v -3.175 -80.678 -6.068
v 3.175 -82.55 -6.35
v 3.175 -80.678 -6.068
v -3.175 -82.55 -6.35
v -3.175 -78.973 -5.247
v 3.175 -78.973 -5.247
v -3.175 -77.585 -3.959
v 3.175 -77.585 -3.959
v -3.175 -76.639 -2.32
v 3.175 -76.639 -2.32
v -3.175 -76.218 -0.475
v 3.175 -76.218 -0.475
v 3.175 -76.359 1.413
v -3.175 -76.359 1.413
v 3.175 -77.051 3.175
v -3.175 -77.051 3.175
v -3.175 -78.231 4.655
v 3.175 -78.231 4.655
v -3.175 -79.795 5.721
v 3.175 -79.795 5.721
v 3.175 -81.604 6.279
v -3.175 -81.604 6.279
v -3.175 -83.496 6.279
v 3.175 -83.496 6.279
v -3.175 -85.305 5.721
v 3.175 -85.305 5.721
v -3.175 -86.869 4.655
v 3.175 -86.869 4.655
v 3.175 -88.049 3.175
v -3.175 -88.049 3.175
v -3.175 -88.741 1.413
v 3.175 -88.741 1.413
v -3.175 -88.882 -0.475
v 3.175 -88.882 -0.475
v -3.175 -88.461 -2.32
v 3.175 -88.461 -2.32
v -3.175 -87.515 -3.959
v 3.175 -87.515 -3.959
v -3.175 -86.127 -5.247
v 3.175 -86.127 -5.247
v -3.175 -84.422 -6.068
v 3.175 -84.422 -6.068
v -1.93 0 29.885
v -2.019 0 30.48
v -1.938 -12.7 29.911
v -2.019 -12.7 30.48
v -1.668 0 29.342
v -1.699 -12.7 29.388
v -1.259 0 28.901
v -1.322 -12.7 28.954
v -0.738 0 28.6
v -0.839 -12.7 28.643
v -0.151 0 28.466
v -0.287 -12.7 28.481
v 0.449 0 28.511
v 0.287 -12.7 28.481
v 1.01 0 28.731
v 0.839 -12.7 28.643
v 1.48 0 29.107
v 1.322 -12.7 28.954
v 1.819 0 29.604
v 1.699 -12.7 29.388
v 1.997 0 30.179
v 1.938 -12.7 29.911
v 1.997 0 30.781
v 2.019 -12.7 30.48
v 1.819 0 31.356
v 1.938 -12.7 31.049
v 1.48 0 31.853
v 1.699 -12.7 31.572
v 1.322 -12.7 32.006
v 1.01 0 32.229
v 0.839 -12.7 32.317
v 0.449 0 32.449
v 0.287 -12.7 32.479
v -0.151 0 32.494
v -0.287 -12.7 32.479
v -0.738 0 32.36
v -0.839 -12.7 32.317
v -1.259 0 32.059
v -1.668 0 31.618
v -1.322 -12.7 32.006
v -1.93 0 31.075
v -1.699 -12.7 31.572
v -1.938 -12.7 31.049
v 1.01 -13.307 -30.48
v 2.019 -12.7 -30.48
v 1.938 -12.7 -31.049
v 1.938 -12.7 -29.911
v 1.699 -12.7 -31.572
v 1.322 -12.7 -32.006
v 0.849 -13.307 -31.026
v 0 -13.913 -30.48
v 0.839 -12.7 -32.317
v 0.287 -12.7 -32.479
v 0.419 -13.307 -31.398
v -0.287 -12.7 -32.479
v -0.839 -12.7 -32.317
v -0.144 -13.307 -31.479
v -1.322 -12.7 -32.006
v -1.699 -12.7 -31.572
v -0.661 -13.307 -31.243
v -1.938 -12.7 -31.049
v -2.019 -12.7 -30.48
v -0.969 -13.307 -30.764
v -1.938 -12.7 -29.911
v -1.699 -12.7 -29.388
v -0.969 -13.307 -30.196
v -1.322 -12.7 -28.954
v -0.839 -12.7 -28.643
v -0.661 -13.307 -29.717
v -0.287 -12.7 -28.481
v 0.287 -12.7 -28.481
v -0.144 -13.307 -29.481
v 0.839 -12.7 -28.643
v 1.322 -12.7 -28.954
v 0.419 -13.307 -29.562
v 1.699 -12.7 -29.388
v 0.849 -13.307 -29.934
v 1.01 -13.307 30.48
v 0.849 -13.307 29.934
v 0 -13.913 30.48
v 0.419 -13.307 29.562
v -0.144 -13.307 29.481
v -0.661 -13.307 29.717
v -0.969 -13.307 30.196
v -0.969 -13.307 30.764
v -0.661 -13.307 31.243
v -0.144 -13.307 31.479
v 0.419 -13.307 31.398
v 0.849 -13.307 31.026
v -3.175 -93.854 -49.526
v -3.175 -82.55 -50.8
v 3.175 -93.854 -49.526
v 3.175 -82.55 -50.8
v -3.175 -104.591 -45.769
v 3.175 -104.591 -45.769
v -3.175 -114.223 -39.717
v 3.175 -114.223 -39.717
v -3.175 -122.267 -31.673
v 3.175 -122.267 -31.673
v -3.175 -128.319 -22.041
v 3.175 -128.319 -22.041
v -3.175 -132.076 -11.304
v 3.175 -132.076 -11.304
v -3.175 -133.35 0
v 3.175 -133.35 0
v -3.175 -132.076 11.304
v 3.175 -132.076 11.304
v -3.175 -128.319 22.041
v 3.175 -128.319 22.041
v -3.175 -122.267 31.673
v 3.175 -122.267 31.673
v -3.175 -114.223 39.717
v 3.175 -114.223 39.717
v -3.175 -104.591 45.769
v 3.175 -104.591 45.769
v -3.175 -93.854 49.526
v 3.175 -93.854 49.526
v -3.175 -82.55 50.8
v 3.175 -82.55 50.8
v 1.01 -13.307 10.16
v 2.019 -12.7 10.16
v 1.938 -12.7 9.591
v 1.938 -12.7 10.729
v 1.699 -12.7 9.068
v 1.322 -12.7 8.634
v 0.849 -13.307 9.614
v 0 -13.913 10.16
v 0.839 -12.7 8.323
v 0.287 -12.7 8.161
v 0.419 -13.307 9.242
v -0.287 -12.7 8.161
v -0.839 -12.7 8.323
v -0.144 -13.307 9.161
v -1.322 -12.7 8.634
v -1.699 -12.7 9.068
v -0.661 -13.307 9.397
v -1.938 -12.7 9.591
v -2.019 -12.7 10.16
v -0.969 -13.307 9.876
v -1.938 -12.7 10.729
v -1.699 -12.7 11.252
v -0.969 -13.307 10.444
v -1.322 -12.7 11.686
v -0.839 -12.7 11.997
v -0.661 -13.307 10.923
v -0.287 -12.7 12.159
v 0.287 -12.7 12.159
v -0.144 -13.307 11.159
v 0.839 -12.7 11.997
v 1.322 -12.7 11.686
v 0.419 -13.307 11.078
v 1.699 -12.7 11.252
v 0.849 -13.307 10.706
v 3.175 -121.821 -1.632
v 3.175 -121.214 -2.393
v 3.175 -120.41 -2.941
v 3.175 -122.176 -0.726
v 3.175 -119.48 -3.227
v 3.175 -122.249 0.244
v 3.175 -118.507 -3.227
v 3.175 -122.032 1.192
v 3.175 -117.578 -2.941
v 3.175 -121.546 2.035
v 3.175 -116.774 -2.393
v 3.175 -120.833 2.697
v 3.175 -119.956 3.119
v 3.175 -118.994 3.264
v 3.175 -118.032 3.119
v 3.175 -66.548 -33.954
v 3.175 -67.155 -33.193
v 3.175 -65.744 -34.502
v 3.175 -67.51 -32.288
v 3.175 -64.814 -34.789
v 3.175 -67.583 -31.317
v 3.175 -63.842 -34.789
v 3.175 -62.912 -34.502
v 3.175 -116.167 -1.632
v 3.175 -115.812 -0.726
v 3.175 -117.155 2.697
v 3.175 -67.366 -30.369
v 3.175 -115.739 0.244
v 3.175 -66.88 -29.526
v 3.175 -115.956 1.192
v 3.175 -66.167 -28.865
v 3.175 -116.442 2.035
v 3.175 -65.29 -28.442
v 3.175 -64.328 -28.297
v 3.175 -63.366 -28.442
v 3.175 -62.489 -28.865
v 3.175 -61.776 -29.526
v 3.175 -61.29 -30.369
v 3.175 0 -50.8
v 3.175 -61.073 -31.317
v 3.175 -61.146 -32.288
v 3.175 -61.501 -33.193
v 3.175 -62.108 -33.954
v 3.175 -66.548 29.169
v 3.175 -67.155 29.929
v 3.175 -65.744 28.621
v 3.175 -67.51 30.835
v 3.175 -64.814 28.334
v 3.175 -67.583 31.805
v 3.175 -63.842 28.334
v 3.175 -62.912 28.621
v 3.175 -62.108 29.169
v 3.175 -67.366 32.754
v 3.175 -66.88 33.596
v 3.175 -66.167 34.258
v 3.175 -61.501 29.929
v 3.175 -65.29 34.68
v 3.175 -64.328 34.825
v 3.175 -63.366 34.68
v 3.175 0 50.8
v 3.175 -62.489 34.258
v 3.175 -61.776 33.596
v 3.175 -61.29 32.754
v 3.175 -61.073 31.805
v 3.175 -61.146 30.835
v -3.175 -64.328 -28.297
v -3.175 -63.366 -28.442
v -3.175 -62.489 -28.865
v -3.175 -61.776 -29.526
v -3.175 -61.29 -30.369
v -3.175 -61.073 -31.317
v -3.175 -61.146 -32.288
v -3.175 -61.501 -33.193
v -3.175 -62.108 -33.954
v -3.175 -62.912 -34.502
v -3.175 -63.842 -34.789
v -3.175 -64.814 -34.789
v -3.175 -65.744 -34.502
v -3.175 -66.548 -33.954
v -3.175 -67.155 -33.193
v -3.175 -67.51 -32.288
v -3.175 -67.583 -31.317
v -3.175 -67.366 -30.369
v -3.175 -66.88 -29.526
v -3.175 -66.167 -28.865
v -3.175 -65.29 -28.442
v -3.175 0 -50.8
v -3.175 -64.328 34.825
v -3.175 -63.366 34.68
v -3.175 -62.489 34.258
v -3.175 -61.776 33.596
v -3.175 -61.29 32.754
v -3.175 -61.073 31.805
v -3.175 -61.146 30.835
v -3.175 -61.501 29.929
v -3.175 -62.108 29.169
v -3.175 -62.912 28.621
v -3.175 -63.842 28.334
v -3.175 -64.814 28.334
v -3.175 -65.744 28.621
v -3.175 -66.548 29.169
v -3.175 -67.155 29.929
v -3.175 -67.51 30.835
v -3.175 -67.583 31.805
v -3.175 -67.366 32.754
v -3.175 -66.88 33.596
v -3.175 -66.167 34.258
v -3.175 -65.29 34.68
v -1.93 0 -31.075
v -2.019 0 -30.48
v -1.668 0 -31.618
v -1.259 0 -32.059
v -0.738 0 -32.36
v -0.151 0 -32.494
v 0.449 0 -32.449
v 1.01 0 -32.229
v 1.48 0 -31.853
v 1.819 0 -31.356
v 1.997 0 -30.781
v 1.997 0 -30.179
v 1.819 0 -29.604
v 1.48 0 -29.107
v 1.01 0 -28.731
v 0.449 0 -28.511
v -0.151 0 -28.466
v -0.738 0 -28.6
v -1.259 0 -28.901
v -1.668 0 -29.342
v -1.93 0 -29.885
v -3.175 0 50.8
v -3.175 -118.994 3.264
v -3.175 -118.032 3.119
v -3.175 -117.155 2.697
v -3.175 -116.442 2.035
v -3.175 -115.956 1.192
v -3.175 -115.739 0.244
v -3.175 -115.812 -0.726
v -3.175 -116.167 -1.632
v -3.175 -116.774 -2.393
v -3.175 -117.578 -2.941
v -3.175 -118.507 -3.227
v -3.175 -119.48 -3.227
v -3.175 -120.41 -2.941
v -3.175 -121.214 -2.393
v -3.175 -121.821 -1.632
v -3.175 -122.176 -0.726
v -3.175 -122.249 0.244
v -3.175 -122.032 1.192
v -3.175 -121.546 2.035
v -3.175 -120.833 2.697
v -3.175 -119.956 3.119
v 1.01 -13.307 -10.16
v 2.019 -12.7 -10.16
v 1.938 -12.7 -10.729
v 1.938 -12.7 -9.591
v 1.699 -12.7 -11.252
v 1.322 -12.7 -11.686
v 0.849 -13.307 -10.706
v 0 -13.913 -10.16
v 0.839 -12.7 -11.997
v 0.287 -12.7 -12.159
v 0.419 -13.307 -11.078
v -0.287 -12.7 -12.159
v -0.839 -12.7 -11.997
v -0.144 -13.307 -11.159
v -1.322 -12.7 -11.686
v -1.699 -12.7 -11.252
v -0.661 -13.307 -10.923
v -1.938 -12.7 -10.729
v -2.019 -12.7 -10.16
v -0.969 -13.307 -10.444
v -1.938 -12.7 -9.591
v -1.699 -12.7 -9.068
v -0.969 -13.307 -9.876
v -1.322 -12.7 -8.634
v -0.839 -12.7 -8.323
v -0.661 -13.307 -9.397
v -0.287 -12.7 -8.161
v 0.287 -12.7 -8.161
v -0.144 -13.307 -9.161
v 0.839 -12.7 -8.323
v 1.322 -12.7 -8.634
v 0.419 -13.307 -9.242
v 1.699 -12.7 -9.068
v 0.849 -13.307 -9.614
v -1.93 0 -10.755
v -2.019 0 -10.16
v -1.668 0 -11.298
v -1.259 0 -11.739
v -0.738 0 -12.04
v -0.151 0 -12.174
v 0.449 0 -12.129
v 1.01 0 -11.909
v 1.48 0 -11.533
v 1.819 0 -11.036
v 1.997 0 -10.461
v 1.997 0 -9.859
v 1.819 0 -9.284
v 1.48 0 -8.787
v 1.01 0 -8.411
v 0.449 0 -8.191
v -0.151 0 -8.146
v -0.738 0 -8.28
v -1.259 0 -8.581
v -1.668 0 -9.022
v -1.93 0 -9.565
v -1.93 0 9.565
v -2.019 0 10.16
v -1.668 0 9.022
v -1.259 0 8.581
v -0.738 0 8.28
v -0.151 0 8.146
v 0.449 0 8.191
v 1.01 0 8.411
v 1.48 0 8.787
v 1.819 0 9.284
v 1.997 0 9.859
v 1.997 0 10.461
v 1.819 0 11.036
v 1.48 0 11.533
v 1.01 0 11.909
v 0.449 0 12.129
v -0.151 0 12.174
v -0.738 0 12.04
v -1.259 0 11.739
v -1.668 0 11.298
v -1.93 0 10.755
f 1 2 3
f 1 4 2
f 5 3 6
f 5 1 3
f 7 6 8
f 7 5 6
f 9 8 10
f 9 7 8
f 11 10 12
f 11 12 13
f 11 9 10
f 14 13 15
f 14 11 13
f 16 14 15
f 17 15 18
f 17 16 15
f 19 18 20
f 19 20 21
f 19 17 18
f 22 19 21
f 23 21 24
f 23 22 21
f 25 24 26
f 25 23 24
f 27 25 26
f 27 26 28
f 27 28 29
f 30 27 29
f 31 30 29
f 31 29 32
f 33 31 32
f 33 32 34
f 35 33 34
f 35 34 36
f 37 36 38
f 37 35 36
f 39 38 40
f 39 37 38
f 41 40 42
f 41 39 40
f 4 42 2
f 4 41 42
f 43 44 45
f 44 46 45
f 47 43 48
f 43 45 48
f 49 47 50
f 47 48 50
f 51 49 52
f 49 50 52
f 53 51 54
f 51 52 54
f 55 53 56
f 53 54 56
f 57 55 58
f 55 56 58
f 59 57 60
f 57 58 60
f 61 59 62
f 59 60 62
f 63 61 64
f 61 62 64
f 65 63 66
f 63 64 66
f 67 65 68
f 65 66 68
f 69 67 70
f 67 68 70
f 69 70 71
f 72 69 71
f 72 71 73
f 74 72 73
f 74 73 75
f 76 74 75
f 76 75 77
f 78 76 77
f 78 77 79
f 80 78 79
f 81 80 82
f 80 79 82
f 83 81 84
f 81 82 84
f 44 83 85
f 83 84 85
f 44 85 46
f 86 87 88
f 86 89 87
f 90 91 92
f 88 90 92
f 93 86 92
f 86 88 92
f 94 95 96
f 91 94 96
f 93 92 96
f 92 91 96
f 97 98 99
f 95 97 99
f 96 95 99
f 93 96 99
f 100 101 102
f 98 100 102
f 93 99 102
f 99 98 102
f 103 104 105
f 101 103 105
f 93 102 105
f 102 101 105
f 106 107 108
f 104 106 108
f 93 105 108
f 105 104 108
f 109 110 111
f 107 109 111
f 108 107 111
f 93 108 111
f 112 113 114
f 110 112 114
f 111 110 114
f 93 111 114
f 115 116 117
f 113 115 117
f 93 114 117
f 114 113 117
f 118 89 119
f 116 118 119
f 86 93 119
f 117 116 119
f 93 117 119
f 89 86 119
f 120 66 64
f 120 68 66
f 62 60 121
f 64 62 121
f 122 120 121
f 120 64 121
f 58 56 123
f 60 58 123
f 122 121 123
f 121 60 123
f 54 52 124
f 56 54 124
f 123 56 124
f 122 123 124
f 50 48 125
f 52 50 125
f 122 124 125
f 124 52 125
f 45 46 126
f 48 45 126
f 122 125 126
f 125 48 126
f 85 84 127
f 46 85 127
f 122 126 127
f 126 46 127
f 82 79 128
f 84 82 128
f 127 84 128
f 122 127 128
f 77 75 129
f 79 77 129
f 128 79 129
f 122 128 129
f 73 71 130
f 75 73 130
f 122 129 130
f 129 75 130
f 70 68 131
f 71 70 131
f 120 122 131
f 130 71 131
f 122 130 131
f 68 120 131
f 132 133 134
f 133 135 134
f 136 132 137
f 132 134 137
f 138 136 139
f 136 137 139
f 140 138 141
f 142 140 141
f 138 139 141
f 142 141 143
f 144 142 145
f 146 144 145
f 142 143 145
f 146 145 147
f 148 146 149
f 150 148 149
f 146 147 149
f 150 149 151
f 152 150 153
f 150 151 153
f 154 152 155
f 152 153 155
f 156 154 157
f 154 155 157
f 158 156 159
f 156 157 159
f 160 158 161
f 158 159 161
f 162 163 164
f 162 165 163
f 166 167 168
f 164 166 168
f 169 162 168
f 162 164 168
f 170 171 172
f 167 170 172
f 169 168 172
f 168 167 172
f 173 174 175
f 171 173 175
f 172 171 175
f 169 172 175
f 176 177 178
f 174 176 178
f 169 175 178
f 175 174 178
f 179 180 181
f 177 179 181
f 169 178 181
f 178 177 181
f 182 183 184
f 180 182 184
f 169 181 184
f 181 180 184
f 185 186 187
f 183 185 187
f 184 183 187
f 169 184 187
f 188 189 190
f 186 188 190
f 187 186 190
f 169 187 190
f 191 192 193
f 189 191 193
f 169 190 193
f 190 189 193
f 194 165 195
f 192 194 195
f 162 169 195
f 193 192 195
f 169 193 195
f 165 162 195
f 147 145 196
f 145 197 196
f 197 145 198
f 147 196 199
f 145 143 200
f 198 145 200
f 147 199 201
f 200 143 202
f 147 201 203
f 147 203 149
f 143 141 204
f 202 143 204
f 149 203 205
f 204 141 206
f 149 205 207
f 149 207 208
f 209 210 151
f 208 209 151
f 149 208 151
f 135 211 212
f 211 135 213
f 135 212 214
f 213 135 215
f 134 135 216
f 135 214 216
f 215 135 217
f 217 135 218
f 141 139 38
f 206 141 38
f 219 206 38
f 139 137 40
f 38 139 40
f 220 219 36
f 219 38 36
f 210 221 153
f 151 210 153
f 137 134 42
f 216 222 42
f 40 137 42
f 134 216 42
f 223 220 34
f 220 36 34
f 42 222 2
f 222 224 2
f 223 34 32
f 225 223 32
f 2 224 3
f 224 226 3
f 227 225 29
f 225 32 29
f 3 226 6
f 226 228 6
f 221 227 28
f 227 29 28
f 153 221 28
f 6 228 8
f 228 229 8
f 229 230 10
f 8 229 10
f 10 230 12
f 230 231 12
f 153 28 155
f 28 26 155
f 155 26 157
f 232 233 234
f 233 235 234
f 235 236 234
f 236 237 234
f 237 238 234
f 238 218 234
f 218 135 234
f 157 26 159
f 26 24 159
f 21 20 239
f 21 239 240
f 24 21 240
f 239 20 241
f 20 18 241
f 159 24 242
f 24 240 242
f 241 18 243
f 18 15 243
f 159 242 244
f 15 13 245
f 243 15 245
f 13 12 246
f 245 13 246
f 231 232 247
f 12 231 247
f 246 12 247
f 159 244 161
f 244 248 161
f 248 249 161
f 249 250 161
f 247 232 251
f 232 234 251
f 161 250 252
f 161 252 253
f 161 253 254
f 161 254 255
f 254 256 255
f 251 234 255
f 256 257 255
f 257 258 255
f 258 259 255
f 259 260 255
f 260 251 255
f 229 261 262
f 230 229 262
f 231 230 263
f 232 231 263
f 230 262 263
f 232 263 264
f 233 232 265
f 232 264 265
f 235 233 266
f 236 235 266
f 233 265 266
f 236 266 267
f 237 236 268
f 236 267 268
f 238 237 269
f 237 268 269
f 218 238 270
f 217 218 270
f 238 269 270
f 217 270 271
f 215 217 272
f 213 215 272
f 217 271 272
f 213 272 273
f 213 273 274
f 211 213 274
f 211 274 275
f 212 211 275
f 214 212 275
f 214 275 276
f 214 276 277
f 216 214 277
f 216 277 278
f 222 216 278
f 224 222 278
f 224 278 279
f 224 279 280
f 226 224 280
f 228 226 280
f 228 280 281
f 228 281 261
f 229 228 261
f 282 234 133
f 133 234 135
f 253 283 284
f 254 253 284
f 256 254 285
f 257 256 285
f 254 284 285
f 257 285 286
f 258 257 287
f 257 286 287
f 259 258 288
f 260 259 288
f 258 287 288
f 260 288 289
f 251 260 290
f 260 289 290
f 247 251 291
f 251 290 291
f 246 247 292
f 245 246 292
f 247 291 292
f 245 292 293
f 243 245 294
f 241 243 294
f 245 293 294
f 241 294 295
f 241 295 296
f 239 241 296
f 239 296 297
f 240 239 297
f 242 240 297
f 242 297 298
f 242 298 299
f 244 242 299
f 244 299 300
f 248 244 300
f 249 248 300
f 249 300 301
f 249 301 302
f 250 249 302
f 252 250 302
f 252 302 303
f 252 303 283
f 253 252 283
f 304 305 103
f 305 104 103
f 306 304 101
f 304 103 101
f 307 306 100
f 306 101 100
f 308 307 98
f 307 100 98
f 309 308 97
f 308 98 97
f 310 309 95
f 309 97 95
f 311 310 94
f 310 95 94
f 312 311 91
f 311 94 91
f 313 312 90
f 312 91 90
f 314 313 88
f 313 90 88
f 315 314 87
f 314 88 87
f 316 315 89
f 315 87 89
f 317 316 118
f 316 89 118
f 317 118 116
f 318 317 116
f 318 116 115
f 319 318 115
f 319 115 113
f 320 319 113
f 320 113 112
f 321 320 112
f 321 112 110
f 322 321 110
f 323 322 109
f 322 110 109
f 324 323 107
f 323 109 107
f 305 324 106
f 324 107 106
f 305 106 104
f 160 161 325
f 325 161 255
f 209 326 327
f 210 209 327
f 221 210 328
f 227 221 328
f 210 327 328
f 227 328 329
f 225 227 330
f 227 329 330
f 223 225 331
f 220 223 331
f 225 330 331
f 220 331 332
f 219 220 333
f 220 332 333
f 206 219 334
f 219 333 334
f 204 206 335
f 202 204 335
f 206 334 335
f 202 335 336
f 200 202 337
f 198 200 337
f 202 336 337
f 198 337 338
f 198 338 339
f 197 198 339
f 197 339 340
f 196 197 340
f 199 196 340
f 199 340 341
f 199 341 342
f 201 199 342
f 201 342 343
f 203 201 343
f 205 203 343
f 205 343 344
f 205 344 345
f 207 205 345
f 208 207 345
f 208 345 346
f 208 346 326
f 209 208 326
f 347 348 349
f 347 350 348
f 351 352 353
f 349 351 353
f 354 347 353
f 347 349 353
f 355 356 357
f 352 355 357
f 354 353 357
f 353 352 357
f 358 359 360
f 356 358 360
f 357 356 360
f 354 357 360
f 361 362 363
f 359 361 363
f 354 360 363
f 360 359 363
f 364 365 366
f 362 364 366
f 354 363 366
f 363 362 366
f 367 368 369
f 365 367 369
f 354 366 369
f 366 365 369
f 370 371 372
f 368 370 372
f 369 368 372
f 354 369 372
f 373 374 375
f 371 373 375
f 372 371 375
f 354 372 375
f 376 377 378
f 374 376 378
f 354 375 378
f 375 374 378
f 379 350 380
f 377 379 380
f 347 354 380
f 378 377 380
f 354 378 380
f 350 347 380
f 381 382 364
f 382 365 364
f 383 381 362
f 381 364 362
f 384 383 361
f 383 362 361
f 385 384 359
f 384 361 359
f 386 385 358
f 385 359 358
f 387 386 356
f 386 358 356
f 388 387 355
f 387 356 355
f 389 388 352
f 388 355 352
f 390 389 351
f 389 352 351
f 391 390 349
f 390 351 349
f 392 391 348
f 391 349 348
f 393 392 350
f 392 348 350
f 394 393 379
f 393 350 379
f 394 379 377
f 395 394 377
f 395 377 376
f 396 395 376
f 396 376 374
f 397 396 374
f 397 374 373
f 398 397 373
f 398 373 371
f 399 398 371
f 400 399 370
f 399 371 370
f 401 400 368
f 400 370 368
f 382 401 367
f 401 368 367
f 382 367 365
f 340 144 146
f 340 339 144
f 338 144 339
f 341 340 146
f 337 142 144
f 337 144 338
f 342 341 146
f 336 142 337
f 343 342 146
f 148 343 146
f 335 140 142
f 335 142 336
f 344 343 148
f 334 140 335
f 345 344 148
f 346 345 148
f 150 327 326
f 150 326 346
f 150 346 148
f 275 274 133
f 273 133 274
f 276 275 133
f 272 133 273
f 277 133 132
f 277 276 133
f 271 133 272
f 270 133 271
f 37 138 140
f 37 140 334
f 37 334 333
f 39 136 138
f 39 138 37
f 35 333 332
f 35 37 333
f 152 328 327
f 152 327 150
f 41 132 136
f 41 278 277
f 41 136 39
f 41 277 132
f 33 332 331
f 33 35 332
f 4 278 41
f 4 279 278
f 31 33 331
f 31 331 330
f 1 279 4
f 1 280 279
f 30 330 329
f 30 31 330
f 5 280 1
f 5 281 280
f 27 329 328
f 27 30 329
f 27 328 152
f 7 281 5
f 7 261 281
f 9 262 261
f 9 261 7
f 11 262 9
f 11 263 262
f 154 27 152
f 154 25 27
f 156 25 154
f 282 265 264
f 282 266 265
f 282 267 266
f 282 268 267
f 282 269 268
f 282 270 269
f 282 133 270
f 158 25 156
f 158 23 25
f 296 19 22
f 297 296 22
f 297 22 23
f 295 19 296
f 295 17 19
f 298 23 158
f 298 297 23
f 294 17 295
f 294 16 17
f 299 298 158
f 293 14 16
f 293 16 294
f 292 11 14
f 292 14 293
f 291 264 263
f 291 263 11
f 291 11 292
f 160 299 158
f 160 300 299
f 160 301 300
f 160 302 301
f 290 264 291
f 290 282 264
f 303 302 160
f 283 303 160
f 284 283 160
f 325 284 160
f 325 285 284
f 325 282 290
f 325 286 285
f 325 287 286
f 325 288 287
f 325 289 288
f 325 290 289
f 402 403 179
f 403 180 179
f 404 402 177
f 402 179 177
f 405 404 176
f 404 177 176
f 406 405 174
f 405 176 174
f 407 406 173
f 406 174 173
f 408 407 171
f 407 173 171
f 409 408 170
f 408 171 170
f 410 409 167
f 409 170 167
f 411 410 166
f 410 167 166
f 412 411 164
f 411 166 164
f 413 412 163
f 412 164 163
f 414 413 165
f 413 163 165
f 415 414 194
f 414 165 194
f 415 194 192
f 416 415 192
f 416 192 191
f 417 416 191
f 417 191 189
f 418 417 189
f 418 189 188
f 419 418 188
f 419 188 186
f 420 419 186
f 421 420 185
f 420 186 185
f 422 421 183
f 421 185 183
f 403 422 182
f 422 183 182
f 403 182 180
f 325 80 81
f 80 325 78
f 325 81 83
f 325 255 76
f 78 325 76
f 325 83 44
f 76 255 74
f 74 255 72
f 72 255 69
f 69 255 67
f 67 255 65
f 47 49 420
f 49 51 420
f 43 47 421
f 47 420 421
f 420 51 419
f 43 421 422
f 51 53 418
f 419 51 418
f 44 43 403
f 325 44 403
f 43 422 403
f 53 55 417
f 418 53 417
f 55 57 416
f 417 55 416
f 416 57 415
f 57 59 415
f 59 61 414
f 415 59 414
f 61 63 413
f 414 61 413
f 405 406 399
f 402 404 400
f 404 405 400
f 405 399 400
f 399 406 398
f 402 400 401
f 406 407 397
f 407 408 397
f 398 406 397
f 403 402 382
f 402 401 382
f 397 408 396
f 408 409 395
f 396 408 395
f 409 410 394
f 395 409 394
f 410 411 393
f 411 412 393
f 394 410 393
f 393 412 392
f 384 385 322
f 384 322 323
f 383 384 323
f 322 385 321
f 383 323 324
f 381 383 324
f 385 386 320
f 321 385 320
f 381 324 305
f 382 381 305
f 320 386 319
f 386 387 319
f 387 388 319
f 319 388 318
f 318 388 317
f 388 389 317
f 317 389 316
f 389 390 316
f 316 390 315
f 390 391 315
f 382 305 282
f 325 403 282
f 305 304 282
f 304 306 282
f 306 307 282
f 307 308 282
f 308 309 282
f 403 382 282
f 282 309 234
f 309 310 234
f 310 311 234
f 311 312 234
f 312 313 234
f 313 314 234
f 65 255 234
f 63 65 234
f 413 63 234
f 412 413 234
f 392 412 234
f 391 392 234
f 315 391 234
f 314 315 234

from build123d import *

# Parameters (mm, degrees)
SKETCH2_R                  = 6.35
BOSS_EXTRUDE1_DEPTH        = 3.175
F_1_4_CLEARANCE_HOLE1_D    = 6.5278
F_10_32_TAPPED_HOLE1_D     = 4.0386
F_10_32_TAPPED_HOLE1_DEPTH = 12.7
F_10_32_TAPPED_HOLE1_TIP   = 1.213317848


with BuildPart() as part:
    # Sketch2 → Boss-Extrude1 (new, symmetric)
    with BuildSketch(Plane(origin=(0, 0, 0), x_dir=(0, 0, -1), z_dir=(1, 0, 0))):
        with BuildLine():
            Line((-50.8, 0), (50.8, 0))
            Line((50.8, 0), (50.8, -82.55))
            ThreePointArc((50.8, -82.55), (0, -133.35), (-50.8, -82.55))
            Line((-50.8, -82.55), (-50.8, 0))
        make_face()
        with Locations((0, -82.55)):
            Circle(SKETCH2_R, mode=Mode.SUBTRACT)
    extrude(amount=BOSS_EXTRUDE1_DEPTH, both=True)

    # 1/4 Clearance Hole1 (through all)
    with Locations(Plane(origin=(3.175, 0, 0), x_dir=(0, 0, -1), z_dir=(1, 0, 0))):
        with Locations((-31.56136055, -64.32803999), (31.56136055, -64.32803999), (0, -118.993920019)):
            Hole(F_1_4_CLEARANCE_HOLE1_D / 2)

    # #10-32 Tapped Hole1
    with Locations(Plane(origin=(0, 0, 0), x_dir=(1, 0, 0), z_dir=(0, 1, 0))):
        with Locations((0, 30.48), (0, 10.16), (0, -10.16), (0, -30.48)):
            Hole(F_10_32_TAPPED_HOLE1_D / 2, depth=F_10_32_TAPPED_HOLE1_DEPTH)
            with Locations((0, 0, -(F_10_32_TAPPED_HOLE1_DEPTH + F_10_32_TAPPED_HOLE1_TIP / 2))):  # 118° drill point
                Cone(0, F_10_32_TAPPED_HOLE1_D / 2, F_10_32_TAPPED_HOLE1_TIP, mode=Mode.SUBTRACT)


solid = part.part
